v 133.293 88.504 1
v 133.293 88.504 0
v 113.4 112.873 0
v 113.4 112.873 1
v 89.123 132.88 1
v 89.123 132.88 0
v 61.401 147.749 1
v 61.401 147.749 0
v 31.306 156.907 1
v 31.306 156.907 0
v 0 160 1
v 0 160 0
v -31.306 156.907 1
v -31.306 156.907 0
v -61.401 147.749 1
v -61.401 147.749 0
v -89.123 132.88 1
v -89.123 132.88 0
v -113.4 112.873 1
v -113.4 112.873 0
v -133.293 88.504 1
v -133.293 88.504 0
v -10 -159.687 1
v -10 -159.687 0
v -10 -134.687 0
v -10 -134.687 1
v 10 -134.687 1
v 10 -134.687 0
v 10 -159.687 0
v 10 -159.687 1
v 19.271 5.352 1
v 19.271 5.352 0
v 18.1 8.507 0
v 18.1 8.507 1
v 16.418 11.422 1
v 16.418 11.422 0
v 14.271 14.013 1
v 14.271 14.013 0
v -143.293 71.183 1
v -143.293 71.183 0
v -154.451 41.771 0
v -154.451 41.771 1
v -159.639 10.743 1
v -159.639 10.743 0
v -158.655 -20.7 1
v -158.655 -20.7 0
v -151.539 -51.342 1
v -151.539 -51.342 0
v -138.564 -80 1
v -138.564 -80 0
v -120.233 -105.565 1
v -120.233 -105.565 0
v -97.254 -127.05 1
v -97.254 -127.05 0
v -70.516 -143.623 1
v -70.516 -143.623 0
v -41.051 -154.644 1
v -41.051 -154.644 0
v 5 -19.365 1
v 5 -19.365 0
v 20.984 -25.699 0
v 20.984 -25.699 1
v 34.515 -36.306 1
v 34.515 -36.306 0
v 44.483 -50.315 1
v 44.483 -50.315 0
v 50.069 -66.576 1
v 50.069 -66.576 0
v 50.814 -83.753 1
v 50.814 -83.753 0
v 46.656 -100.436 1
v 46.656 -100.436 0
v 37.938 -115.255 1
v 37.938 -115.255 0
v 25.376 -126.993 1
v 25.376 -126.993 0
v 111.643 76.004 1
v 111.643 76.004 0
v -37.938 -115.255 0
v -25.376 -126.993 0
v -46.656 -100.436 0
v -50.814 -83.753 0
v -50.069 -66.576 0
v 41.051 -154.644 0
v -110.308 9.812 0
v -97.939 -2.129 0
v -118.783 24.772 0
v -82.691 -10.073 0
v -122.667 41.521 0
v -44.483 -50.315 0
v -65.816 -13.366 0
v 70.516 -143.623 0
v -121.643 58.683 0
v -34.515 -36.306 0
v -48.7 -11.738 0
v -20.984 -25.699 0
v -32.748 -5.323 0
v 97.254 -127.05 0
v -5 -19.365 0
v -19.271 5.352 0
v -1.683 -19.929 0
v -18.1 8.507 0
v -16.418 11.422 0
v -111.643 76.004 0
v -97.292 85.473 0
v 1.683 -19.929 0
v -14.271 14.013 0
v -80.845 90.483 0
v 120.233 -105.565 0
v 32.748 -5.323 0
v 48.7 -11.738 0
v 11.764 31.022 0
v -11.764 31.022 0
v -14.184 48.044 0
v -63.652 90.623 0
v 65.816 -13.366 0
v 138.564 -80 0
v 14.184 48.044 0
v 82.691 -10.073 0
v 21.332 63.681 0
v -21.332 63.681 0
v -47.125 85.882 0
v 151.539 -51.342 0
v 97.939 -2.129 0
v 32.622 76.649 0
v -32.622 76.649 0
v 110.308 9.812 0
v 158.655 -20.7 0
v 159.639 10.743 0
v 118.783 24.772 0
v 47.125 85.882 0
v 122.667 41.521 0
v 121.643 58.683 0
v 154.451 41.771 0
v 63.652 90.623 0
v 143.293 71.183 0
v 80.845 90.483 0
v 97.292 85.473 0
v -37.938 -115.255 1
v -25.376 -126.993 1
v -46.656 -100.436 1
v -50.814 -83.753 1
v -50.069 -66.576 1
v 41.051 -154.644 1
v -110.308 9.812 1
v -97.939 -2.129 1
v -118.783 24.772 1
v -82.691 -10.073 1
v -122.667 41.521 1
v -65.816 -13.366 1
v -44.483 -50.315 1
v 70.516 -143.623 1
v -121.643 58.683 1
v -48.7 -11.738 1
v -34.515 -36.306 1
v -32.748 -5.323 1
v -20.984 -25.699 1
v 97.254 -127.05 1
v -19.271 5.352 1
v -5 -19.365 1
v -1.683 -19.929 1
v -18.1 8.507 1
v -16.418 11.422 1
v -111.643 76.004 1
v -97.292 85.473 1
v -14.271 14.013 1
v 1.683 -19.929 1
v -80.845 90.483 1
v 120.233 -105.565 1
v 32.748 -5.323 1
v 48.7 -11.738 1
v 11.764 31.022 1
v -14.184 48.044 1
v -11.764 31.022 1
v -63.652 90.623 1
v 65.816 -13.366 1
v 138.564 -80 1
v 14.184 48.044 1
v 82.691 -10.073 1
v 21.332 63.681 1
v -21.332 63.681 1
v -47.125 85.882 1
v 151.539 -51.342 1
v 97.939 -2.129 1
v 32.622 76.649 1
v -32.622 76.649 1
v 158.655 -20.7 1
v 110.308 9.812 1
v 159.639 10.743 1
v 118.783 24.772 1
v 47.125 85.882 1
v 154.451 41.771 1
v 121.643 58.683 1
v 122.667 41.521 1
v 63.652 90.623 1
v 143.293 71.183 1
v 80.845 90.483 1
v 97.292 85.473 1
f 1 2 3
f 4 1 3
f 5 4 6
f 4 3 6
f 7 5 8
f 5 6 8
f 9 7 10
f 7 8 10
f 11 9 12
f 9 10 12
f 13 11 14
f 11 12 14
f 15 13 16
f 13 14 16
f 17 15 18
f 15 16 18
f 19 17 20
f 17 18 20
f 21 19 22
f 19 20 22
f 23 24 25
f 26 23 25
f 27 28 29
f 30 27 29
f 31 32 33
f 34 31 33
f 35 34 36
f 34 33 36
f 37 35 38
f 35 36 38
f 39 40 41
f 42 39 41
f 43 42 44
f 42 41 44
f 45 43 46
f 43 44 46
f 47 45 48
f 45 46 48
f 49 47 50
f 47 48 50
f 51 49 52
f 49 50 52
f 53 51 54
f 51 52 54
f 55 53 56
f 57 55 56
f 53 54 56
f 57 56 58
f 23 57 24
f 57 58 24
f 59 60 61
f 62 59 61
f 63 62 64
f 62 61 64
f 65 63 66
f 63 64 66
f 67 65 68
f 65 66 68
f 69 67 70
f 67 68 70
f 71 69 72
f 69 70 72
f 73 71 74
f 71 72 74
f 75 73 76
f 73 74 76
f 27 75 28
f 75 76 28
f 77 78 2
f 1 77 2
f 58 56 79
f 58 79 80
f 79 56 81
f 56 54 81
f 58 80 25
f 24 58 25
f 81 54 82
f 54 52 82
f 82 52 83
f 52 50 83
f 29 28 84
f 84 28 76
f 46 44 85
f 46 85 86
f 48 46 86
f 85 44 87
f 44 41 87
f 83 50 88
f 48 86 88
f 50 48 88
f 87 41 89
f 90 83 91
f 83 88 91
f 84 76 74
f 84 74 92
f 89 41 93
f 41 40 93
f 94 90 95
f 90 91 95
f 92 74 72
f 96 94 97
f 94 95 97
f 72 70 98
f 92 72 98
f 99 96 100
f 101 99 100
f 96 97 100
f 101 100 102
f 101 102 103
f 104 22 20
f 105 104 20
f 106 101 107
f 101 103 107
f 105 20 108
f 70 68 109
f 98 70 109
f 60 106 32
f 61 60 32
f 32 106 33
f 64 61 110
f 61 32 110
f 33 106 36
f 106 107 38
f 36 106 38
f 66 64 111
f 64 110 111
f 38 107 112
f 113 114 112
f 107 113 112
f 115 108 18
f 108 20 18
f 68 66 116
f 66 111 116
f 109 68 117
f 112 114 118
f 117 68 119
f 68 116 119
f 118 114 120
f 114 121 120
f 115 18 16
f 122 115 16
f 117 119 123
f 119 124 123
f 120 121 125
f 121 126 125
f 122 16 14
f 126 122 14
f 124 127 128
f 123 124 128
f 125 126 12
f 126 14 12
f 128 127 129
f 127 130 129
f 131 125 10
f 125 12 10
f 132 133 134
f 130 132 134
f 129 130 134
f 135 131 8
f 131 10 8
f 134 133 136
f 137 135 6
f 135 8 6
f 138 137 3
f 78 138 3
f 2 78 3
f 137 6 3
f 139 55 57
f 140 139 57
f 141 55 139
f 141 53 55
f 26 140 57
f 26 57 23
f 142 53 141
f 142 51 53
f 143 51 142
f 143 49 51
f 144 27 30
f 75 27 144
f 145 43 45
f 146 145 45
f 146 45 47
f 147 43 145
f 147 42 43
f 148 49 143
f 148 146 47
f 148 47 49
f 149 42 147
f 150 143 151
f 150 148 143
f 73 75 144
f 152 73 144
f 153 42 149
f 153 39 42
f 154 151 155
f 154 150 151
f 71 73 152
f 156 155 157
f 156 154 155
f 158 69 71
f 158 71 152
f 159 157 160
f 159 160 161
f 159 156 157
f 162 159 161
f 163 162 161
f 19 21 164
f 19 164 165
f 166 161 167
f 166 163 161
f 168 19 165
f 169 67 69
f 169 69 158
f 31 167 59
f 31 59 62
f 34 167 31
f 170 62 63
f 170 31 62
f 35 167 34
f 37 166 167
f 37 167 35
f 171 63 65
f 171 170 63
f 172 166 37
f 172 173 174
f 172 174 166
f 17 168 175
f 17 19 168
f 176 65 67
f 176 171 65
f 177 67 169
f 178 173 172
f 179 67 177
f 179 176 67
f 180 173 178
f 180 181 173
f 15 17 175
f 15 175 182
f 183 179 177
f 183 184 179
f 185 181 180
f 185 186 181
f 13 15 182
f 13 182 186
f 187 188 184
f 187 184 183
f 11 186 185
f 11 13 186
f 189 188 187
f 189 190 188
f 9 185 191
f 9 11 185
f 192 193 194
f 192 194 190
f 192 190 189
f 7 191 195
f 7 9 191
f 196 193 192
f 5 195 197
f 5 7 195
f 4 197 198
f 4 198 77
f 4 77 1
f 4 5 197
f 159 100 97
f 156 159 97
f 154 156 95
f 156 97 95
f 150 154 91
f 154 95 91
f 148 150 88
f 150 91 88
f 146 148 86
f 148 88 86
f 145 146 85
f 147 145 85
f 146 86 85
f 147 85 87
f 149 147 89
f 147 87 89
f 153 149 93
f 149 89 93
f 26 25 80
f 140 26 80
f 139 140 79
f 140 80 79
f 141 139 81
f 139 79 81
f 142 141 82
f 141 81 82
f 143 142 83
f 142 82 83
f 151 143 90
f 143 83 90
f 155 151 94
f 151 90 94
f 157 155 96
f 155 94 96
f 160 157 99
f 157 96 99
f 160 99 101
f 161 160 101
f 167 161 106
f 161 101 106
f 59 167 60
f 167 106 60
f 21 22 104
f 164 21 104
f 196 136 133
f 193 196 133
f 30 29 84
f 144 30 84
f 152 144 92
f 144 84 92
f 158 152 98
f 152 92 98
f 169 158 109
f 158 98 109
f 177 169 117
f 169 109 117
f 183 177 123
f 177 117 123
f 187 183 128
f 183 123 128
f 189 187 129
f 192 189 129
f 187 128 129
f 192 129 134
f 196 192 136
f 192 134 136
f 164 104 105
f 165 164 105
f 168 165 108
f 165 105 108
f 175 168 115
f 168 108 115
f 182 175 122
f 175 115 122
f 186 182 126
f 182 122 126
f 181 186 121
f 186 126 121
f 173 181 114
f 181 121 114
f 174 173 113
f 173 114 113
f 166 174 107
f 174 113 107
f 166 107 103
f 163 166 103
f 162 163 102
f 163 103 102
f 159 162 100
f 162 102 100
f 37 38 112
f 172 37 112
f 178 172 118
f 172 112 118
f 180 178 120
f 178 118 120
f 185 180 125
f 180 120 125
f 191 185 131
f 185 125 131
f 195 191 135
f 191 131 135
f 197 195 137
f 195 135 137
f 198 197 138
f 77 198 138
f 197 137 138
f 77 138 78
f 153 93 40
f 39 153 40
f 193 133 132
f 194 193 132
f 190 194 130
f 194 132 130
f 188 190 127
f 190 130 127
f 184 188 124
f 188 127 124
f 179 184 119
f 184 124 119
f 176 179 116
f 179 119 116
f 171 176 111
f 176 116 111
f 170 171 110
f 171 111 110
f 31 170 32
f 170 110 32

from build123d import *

# Parameters (mm, degrees)
F1_DEPTH = 1


with BuildPart() as f1:
    # F0 (on Top) → F1 (new body)
    with BuildSketch(Plane.XY):
        with BuildLine():
            ThreePointArc((-10, -134.687194), (-51.059593, -75.137453), (-5, -19.364917))
            ThreePointArc((-5, -19.364917), (0, -20), (5, -19.364917))
            ThreePointArc((5, -19.364917), (51.059593, -75.137453), (10, -134.687194))
            Line((10, -134.687194), (10, -159.687194))
            ThreePointArc((10, -159.687194), (138.564065, -80), (143.293167, 71.183343))
            Line((143.293167, 71.183343), (121.642532, 58.683343))
            ThreePointArc((121.642532, 58.683343), (90.60074, -6.650179), (19.27051, 5.352331))
            ThreePointArc((19.27051, 5.352331), (17.320508, 10), (14.27051, 14.012585))
            ThreePointArc((14.27051, 14.012585), (39.541146, 81.787631), (111.642532, 76.003851))
            Line((111.642532, 76.003851), (133.293167, 88.503851))
            ThreePointArc((133.293167, 88.503851), (0, 160), (-133.293167, 88.503851))
            Line((-133.293167, 88.503851), (-111.642532, 76.003851))
            ThreePointArc((-111.642532, 76.003851), (-39.541146, 81.787631), (-14.27051, 14.012585))
            ThreePointArc((-14.27051, 14.012585), (-17.320508, 10), (-19.27051, 5.352331))
            ThreePointArc((-19.27051, 5.352331), (-90.60074, -6.650179), (-121.642532, 58.683343))
            Line((-121.642532, 58.683343), (-143.293167, 71.183343))
            ThreePointArc((-143.293167, 71.183343), (-138.564065, -80), (-10, -159.687194))
            Line((-10, -159.687194), (-10, -134.687194))
        make_face()
    extrude(amount=F1_DEPTH)


solid = f1.part
